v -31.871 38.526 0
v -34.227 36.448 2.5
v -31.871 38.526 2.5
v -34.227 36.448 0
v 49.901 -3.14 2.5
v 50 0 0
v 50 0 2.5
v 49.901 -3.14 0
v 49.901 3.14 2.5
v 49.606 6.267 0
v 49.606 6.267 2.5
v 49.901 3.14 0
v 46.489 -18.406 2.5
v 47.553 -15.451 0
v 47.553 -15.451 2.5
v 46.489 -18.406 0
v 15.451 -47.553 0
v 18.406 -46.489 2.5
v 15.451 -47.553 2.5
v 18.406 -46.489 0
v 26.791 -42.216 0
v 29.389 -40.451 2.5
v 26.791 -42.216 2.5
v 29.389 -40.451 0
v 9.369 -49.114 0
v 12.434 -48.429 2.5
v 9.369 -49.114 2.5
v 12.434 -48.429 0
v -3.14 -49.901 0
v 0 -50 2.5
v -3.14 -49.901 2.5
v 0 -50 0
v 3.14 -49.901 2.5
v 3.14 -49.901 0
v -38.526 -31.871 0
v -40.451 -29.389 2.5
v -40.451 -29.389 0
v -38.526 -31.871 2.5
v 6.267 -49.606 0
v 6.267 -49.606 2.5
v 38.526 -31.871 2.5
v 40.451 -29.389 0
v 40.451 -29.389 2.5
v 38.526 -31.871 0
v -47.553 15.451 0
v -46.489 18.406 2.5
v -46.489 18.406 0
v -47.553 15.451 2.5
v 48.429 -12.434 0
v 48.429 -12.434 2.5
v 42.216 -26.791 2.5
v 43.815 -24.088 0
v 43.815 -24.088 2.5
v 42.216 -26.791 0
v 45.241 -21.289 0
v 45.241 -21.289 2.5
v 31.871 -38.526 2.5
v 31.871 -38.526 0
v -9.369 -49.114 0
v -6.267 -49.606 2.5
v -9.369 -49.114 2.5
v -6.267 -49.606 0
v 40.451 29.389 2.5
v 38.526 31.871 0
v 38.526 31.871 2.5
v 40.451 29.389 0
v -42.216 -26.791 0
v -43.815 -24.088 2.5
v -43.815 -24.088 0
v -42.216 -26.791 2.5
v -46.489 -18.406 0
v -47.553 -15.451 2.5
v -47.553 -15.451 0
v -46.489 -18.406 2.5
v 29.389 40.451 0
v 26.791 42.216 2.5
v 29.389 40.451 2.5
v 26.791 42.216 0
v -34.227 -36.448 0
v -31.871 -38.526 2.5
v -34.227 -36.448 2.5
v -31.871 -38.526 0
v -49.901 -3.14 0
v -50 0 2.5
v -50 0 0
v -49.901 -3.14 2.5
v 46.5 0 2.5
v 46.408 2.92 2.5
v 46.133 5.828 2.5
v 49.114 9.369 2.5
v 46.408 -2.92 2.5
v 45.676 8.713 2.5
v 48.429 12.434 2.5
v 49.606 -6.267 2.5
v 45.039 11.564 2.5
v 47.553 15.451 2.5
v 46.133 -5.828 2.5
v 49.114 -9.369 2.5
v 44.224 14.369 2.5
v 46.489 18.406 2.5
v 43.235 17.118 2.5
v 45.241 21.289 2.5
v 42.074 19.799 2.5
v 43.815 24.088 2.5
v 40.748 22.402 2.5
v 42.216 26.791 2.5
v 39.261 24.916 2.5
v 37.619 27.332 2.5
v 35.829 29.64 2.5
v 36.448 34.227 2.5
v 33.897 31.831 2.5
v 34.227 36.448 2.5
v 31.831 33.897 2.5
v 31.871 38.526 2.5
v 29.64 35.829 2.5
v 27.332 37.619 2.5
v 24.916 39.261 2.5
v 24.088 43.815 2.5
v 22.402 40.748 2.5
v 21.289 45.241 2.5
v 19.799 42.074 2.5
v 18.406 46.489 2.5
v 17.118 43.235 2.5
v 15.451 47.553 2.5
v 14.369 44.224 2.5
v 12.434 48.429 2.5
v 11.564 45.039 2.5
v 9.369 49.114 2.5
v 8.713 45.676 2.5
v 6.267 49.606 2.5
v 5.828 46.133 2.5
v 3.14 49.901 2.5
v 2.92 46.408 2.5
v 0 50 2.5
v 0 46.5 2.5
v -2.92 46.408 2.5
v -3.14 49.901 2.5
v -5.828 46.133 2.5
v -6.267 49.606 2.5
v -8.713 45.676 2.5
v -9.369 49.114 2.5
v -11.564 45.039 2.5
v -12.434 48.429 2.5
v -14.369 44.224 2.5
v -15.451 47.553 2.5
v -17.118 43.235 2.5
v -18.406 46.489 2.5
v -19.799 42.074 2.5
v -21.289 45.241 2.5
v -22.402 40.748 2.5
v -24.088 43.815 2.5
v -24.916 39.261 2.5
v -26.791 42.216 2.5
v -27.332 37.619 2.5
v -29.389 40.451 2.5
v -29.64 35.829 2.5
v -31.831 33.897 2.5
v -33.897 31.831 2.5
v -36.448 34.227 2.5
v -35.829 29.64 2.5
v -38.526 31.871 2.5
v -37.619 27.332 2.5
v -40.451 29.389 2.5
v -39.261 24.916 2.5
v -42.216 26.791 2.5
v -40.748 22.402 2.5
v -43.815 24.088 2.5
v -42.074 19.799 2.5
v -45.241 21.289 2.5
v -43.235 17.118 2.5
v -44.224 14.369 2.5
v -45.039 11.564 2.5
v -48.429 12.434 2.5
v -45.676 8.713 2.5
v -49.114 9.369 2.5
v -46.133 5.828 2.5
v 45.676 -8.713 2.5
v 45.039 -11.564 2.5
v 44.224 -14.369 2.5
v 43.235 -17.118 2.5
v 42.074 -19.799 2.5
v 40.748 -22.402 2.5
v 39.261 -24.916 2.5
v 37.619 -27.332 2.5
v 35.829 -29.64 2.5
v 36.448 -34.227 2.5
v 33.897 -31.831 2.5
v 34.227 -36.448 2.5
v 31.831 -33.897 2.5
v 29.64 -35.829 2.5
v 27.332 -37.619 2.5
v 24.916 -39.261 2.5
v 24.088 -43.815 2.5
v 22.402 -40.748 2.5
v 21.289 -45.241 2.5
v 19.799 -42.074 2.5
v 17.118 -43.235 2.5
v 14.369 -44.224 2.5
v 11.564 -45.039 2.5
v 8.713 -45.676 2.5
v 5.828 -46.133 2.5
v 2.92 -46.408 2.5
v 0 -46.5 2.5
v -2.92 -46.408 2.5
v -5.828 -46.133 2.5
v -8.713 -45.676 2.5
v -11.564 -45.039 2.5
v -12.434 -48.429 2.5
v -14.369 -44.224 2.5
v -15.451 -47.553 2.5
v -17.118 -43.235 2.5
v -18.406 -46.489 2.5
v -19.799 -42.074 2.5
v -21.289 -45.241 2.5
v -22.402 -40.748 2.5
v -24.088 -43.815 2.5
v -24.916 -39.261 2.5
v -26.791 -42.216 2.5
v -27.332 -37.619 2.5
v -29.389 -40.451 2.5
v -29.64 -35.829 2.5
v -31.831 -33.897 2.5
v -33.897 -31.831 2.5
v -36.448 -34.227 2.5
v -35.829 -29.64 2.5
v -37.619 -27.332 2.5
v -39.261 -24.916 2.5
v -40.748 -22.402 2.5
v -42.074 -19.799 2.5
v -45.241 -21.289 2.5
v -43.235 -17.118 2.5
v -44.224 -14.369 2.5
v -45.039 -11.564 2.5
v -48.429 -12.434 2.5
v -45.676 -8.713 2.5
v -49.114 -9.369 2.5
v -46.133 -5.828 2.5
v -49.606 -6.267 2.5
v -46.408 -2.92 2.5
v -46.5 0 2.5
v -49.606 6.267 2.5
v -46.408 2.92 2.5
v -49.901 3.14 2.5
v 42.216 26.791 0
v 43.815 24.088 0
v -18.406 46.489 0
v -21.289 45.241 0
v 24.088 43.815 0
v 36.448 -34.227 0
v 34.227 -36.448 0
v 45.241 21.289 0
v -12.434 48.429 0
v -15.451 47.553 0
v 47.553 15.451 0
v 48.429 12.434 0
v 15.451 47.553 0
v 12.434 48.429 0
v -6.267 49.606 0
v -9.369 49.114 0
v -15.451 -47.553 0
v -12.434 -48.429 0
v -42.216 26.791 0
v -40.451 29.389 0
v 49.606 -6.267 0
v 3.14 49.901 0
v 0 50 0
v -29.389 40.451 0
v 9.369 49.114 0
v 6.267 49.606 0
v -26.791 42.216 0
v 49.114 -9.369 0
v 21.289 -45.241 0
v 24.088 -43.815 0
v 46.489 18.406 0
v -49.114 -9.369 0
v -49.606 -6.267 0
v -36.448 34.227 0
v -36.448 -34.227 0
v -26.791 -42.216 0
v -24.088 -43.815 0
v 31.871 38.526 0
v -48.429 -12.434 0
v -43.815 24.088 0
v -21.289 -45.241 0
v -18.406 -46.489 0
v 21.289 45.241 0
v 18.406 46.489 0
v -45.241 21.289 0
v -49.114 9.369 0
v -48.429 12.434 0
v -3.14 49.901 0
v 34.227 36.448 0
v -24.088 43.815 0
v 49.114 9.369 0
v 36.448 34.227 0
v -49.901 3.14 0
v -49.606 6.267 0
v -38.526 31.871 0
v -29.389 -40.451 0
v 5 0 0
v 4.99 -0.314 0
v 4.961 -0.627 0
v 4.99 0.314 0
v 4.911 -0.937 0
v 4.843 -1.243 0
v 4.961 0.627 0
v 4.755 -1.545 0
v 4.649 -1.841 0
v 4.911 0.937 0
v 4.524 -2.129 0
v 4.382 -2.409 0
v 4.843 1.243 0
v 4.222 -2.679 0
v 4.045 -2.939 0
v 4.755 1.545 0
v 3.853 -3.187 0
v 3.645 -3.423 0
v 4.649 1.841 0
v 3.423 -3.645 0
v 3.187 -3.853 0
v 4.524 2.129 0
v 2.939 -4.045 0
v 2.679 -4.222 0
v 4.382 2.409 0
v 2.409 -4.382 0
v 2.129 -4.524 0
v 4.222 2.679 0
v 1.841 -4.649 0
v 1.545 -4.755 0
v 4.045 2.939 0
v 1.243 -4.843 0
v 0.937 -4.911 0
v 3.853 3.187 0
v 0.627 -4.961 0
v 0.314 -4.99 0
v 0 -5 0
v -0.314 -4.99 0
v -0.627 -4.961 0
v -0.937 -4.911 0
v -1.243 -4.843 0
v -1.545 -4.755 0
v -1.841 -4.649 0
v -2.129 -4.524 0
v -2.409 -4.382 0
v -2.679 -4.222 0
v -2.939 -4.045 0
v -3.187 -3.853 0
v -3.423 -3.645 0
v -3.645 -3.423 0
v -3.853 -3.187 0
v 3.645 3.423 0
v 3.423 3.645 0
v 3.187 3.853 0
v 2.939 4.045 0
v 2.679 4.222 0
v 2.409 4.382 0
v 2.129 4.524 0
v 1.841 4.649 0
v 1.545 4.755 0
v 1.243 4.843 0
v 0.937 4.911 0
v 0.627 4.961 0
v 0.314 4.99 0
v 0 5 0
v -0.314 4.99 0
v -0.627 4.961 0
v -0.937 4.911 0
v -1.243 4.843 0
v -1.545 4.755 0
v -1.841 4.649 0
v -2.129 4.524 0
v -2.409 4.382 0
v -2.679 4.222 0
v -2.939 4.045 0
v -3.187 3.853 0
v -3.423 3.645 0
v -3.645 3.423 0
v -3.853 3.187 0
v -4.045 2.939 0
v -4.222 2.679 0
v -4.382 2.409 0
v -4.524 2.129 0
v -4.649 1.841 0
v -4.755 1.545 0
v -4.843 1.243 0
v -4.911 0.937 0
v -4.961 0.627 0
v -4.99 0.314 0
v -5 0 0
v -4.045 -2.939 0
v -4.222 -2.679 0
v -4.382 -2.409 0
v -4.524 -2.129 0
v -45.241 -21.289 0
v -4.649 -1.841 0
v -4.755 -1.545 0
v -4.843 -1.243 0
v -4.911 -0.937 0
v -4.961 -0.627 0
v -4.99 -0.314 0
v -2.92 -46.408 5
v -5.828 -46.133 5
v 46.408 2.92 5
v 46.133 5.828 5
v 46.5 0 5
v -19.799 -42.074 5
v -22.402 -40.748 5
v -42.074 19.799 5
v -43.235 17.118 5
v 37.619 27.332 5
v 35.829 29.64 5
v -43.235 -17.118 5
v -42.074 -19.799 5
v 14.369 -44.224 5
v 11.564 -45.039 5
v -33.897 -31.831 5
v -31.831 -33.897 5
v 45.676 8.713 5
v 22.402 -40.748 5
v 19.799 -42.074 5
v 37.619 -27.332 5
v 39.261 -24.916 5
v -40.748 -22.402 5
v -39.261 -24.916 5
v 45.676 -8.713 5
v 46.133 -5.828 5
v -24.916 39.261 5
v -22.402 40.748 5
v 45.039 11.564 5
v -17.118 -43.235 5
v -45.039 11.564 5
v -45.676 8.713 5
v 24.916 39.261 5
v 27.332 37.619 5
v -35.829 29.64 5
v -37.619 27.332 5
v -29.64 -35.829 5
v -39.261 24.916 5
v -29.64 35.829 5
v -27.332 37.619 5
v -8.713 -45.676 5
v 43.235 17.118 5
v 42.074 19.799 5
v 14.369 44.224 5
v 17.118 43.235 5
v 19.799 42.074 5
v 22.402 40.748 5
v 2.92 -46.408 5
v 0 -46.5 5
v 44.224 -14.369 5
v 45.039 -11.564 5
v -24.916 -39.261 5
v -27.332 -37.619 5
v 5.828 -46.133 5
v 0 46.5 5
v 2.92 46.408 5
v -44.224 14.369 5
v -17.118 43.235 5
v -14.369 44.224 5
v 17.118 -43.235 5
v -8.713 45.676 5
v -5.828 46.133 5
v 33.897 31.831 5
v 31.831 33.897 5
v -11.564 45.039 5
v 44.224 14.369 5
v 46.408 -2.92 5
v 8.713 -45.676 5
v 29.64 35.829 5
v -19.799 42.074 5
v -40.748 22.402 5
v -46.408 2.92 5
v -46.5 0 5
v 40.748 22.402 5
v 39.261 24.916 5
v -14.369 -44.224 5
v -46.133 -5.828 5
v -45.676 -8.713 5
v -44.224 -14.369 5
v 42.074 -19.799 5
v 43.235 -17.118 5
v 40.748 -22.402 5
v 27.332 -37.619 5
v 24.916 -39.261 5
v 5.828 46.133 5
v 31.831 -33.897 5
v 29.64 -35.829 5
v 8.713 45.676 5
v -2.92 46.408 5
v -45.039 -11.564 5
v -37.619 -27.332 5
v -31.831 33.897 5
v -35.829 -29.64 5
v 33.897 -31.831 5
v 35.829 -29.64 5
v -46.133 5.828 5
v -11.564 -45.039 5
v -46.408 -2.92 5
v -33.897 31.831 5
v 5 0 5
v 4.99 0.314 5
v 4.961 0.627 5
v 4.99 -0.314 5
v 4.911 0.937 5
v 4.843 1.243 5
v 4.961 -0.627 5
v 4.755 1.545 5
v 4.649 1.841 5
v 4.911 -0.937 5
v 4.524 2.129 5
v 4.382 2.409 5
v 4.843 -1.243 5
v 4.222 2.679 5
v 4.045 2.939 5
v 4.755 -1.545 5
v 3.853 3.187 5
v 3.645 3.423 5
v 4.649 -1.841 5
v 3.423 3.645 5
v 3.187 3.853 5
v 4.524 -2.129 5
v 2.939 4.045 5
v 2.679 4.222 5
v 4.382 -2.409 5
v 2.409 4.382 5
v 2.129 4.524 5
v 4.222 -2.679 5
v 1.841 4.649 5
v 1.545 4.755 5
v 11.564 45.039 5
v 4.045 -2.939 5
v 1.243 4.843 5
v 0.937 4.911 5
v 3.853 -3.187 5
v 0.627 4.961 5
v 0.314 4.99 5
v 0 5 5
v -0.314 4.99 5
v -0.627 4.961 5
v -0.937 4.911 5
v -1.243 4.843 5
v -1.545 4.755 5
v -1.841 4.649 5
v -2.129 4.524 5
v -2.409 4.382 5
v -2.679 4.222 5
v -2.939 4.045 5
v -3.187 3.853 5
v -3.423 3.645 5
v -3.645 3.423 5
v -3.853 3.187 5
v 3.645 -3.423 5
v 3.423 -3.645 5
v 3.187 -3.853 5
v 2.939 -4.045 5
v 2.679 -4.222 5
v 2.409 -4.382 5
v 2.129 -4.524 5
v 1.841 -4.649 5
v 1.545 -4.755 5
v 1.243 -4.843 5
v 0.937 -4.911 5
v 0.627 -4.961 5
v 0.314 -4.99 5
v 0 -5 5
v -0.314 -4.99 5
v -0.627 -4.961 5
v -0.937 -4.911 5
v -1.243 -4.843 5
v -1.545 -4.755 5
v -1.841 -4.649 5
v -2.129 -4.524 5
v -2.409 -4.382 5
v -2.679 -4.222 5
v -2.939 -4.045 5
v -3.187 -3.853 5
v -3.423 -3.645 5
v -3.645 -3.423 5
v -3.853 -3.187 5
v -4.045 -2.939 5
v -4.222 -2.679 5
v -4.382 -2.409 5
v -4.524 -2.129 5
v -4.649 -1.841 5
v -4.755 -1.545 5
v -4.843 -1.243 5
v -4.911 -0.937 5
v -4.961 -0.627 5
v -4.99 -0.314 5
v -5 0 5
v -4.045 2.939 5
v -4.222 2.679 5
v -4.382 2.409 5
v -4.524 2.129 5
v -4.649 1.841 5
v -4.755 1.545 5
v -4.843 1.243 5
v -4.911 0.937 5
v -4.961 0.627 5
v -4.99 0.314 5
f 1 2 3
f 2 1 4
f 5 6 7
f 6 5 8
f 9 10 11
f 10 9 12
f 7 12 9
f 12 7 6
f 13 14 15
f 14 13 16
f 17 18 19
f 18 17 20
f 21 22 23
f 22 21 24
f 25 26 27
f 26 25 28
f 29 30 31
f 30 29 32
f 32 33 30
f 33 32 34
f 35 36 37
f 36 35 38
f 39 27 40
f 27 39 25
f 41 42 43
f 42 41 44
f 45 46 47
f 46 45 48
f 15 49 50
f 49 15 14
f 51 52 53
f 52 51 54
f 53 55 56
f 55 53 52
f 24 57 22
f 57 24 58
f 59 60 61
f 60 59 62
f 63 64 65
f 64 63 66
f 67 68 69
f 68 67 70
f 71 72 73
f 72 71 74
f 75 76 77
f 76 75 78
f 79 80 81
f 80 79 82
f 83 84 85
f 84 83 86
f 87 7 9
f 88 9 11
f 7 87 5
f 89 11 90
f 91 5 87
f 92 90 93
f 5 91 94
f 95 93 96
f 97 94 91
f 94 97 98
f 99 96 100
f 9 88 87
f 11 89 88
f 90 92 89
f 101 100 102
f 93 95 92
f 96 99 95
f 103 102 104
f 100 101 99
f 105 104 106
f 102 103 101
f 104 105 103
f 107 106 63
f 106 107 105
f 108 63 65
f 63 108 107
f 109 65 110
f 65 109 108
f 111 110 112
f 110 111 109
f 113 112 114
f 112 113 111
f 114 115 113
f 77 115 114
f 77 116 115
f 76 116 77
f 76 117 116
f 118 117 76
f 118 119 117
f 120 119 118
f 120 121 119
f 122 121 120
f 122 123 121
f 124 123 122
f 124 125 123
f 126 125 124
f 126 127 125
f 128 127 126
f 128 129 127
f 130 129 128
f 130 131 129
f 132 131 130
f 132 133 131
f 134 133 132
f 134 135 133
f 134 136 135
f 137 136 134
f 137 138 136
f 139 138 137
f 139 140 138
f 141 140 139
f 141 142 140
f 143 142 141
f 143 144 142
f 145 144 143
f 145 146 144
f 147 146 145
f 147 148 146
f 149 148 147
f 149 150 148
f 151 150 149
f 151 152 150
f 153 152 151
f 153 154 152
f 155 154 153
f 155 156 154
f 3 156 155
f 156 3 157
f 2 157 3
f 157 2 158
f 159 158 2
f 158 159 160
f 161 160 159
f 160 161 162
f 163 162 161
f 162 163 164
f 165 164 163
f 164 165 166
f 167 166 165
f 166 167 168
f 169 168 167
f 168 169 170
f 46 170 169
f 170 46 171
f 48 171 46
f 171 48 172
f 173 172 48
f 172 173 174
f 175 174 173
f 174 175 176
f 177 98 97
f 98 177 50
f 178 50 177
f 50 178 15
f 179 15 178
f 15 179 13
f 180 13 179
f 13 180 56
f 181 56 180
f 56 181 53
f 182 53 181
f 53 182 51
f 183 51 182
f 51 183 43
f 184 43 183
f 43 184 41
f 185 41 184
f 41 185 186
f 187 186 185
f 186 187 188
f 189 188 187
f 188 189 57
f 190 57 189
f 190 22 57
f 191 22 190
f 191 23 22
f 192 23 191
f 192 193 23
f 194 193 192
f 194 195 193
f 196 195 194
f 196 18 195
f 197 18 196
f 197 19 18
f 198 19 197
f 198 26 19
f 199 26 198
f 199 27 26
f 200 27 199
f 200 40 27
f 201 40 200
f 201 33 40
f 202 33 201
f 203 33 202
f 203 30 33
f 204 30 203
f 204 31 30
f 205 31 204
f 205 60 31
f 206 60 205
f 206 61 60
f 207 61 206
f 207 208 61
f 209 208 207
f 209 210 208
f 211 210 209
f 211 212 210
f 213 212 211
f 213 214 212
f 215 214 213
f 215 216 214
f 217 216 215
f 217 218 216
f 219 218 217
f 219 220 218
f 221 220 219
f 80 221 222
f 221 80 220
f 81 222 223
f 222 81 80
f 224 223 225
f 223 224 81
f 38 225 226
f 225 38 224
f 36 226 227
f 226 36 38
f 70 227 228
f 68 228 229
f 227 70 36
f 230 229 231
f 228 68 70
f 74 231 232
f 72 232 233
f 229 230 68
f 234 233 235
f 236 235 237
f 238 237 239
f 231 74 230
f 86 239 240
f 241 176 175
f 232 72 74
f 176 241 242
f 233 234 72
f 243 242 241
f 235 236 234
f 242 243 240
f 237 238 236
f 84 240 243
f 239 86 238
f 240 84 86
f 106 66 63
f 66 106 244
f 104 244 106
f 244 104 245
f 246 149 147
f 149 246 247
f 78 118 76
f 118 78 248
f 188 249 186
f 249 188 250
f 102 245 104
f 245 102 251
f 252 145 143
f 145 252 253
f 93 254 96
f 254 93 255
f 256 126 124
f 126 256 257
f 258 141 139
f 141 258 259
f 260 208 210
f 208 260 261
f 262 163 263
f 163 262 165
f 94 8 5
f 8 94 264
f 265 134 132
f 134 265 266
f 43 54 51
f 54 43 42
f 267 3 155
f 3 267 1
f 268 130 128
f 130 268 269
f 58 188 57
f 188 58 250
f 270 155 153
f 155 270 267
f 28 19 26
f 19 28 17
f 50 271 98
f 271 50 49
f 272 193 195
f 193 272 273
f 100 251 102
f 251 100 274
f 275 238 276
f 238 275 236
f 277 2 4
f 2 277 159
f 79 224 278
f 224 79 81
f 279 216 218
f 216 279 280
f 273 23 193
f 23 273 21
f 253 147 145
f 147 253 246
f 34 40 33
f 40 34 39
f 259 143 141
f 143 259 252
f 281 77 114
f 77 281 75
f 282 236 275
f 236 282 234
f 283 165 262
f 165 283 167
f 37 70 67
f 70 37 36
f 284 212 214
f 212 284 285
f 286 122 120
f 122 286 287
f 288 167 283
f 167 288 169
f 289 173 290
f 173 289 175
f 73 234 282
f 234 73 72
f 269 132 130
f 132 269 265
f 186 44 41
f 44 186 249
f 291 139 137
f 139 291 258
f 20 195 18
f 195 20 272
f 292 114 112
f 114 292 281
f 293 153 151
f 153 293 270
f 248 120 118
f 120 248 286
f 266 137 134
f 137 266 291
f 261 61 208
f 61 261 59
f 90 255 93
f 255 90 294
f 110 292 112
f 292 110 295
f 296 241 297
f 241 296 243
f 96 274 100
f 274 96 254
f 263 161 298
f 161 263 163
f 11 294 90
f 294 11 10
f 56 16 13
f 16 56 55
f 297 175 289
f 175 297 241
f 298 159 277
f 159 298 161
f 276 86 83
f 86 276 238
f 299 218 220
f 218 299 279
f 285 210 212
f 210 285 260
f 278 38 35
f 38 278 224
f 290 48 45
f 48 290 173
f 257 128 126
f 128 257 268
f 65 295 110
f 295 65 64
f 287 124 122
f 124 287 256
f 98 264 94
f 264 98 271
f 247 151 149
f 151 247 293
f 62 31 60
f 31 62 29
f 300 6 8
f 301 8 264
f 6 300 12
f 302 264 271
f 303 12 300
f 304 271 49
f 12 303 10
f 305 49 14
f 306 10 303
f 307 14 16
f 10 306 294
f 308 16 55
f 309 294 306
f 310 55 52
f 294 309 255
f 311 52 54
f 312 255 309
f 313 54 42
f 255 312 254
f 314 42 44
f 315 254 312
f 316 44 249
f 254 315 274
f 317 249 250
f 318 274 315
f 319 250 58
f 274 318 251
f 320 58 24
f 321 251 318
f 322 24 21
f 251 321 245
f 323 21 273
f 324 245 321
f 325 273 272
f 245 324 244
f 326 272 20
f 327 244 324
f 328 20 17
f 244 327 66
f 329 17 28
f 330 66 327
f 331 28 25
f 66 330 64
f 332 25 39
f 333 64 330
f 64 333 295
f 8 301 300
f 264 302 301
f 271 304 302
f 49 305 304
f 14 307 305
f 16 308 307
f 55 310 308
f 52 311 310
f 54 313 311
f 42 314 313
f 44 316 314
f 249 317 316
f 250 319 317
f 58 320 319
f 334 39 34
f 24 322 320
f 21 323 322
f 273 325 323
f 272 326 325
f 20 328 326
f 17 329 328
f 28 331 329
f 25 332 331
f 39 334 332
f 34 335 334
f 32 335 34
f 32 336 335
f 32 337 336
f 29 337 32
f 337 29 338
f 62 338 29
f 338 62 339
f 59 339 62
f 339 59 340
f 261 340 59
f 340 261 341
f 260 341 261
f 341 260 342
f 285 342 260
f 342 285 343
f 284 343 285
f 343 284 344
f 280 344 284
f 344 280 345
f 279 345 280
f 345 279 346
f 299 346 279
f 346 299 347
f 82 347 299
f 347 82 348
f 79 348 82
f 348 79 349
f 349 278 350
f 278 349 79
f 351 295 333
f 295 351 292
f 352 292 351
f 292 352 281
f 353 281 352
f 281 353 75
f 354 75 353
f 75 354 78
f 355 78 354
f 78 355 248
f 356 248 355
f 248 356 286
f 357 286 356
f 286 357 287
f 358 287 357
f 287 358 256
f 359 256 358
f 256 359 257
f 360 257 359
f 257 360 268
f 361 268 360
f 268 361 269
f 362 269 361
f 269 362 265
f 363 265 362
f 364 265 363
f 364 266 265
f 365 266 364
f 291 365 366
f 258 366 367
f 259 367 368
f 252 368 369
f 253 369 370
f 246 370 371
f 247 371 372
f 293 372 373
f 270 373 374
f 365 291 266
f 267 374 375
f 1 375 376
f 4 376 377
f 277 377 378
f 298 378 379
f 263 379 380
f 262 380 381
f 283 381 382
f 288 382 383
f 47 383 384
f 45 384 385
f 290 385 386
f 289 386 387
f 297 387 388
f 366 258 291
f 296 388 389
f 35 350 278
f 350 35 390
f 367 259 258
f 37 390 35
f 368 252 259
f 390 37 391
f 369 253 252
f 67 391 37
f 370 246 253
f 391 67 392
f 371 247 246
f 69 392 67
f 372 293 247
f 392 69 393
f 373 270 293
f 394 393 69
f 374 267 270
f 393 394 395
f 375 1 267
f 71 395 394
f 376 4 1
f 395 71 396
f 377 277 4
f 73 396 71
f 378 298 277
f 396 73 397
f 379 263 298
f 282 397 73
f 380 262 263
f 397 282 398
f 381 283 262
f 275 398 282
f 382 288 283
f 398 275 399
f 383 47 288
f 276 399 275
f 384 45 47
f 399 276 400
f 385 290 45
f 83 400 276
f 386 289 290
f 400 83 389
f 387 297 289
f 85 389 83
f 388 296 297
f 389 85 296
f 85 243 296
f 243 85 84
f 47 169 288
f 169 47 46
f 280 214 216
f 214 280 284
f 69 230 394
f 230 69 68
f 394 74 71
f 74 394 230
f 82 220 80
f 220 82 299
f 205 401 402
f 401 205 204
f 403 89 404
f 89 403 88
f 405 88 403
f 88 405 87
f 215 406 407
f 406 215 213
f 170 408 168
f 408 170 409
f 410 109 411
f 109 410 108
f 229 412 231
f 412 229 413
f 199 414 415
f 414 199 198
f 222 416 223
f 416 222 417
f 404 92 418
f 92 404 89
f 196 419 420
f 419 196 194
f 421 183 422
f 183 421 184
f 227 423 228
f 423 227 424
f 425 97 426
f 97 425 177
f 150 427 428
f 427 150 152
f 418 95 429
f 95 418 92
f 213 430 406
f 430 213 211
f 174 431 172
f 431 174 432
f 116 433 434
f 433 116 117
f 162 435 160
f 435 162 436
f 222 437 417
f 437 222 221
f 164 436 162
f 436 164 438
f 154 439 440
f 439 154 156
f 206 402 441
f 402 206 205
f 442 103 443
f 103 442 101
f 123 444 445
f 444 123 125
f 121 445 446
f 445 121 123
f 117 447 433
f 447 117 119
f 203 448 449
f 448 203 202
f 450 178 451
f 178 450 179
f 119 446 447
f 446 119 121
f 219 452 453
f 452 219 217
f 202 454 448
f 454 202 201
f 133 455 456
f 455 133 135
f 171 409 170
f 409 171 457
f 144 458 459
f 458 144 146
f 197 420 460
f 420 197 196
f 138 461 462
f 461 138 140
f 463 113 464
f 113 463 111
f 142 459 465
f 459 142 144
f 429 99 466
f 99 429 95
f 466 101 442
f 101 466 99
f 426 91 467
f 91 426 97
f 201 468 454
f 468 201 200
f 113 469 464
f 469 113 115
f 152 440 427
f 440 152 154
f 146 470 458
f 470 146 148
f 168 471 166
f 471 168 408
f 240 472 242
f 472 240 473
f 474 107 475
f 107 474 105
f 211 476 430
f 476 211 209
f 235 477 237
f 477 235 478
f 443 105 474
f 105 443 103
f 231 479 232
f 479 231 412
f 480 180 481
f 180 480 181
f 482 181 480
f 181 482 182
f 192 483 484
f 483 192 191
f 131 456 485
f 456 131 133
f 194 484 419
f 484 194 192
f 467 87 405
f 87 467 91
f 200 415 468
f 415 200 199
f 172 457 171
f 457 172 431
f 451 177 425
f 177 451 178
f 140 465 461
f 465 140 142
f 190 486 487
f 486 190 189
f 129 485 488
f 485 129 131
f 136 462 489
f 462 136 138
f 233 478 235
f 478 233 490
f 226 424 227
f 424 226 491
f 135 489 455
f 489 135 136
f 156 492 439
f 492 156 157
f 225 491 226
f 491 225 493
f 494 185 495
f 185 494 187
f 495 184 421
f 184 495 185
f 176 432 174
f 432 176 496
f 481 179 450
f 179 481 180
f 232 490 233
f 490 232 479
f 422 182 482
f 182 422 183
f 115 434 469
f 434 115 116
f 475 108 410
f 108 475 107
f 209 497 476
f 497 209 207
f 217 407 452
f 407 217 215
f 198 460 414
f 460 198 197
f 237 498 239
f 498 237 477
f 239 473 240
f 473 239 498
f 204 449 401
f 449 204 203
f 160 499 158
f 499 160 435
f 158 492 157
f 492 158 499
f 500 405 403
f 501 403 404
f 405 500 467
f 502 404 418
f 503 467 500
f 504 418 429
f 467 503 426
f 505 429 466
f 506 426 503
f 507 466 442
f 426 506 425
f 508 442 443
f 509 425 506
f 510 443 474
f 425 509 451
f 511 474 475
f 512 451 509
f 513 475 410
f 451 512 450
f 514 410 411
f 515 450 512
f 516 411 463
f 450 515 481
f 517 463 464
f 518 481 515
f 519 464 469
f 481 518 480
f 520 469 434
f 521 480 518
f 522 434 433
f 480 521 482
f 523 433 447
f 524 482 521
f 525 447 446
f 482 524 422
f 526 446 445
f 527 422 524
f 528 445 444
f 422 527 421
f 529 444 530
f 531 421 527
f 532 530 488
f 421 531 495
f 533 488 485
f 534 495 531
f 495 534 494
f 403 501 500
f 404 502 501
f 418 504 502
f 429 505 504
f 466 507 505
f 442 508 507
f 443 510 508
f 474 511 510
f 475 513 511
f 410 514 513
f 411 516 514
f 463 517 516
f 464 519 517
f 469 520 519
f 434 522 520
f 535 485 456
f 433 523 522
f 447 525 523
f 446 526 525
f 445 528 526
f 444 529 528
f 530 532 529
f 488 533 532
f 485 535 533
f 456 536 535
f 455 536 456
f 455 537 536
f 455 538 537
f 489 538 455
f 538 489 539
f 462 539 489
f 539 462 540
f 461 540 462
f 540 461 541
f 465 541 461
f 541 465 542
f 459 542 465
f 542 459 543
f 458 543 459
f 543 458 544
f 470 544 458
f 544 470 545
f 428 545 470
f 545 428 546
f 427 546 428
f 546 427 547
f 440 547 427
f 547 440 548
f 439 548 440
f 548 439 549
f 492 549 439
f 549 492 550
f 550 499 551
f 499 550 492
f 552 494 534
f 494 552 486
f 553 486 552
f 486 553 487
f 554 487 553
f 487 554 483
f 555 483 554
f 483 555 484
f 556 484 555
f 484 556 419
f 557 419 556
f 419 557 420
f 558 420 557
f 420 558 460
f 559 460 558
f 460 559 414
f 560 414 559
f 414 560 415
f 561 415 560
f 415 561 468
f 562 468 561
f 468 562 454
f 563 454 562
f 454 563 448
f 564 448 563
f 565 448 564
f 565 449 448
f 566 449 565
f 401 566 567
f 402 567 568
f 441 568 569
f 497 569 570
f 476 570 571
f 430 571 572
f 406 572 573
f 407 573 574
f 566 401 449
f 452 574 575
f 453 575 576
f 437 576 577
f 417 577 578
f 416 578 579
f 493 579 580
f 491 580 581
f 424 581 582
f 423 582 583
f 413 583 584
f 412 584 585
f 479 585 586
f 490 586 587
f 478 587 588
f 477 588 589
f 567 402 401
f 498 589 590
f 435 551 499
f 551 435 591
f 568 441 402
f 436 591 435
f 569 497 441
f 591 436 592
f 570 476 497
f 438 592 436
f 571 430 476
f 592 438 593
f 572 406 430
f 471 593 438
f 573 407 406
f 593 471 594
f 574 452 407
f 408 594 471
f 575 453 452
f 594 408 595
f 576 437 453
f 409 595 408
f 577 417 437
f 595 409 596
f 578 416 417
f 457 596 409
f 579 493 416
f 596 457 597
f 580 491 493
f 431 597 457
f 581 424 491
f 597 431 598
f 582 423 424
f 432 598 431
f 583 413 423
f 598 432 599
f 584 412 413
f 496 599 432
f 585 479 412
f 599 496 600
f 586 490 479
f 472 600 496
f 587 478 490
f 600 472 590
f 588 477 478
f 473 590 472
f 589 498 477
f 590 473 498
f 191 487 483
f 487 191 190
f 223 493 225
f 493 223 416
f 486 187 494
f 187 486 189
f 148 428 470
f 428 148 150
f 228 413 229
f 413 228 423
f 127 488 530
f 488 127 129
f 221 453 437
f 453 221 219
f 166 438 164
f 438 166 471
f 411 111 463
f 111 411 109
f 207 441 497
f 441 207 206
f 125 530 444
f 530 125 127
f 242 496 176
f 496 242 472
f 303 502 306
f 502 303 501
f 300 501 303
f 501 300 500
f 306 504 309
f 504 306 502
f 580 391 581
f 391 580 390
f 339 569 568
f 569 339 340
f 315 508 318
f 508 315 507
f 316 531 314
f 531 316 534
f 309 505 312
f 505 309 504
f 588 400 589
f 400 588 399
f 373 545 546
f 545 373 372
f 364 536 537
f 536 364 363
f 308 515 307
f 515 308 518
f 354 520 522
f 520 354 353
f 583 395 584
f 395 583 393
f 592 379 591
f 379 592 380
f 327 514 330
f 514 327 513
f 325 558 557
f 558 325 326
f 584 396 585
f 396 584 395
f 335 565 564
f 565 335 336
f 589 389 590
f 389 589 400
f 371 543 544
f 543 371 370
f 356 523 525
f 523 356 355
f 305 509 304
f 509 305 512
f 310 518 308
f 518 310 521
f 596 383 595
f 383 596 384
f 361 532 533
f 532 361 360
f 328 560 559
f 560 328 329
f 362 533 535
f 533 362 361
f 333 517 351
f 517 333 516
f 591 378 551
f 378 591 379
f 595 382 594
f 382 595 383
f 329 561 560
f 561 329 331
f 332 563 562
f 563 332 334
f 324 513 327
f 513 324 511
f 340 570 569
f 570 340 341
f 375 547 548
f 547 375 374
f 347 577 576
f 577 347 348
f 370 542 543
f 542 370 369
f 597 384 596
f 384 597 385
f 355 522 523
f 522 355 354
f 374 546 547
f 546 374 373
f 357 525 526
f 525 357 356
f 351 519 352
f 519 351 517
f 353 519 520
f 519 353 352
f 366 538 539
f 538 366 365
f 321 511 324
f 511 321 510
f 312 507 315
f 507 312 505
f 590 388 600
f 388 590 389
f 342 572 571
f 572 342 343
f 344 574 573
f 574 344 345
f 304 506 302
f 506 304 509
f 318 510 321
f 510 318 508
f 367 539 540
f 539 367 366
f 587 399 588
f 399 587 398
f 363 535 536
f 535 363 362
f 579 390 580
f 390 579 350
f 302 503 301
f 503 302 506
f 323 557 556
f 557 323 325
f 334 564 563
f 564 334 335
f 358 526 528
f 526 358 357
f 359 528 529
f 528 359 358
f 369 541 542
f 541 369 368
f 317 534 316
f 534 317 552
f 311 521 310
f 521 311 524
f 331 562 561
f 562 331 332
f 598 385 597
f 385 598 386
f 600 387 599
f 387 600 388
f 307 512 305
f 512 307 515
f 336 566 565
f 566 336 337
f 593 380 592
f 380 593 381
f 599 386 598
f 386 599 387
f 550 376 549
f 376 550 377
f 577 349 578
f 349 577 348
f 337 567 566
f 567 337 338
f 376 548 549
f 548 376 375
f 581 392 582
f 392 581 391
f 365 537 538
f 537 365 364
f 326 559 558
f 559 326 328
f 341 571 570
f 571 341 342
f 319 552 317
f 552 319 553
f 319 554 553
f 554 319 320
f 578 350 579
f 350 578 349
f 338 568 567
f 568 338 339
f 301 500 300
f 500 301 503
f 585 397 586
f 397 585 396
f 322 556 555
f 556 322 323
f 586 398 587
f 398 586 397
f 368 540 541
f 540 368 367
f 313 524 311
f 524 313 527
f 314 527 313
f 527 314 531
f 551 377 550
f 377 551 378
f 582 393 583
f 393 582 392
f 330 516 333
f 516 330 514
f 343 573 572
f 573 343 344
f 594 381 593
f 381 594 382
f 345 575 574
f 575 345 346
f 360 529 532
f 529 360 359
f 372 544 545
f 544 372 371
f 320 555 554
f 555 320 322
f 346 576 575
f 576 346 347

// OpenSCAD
// 定义杯盖的参数
// 上部外径
outer_diameter_top = 100;
// 下部外径
outer_diameter_bottom = 93;
// 上部高度
height_top = 2.5;
// 下部高度
height_bottom = 2.5;
// 吸管孔的直径
straw_hole_diameter = 10;

// 创建杯盖
module cup_lid() {
    difference() {
        union() {
            // 上部圆柱
            cylinder(h = height_top, d = outer_diameter_top, $fn = 100);
            // 下部圆柱
            translate([0, 0, height_top])
                cylinder(h = height_bottom, d = outer_diameter_bottom, $fn = 100);
        }
        // 吸管孔
        translate([0, 0, -1]) // 向下移动1mm以确保完全切割
            cylinder(h = height_top + height_bottom + 2, d = straw_hole_diameter, $fn = 100);
    }
}

// 渲染杯盖
cup_lid();
